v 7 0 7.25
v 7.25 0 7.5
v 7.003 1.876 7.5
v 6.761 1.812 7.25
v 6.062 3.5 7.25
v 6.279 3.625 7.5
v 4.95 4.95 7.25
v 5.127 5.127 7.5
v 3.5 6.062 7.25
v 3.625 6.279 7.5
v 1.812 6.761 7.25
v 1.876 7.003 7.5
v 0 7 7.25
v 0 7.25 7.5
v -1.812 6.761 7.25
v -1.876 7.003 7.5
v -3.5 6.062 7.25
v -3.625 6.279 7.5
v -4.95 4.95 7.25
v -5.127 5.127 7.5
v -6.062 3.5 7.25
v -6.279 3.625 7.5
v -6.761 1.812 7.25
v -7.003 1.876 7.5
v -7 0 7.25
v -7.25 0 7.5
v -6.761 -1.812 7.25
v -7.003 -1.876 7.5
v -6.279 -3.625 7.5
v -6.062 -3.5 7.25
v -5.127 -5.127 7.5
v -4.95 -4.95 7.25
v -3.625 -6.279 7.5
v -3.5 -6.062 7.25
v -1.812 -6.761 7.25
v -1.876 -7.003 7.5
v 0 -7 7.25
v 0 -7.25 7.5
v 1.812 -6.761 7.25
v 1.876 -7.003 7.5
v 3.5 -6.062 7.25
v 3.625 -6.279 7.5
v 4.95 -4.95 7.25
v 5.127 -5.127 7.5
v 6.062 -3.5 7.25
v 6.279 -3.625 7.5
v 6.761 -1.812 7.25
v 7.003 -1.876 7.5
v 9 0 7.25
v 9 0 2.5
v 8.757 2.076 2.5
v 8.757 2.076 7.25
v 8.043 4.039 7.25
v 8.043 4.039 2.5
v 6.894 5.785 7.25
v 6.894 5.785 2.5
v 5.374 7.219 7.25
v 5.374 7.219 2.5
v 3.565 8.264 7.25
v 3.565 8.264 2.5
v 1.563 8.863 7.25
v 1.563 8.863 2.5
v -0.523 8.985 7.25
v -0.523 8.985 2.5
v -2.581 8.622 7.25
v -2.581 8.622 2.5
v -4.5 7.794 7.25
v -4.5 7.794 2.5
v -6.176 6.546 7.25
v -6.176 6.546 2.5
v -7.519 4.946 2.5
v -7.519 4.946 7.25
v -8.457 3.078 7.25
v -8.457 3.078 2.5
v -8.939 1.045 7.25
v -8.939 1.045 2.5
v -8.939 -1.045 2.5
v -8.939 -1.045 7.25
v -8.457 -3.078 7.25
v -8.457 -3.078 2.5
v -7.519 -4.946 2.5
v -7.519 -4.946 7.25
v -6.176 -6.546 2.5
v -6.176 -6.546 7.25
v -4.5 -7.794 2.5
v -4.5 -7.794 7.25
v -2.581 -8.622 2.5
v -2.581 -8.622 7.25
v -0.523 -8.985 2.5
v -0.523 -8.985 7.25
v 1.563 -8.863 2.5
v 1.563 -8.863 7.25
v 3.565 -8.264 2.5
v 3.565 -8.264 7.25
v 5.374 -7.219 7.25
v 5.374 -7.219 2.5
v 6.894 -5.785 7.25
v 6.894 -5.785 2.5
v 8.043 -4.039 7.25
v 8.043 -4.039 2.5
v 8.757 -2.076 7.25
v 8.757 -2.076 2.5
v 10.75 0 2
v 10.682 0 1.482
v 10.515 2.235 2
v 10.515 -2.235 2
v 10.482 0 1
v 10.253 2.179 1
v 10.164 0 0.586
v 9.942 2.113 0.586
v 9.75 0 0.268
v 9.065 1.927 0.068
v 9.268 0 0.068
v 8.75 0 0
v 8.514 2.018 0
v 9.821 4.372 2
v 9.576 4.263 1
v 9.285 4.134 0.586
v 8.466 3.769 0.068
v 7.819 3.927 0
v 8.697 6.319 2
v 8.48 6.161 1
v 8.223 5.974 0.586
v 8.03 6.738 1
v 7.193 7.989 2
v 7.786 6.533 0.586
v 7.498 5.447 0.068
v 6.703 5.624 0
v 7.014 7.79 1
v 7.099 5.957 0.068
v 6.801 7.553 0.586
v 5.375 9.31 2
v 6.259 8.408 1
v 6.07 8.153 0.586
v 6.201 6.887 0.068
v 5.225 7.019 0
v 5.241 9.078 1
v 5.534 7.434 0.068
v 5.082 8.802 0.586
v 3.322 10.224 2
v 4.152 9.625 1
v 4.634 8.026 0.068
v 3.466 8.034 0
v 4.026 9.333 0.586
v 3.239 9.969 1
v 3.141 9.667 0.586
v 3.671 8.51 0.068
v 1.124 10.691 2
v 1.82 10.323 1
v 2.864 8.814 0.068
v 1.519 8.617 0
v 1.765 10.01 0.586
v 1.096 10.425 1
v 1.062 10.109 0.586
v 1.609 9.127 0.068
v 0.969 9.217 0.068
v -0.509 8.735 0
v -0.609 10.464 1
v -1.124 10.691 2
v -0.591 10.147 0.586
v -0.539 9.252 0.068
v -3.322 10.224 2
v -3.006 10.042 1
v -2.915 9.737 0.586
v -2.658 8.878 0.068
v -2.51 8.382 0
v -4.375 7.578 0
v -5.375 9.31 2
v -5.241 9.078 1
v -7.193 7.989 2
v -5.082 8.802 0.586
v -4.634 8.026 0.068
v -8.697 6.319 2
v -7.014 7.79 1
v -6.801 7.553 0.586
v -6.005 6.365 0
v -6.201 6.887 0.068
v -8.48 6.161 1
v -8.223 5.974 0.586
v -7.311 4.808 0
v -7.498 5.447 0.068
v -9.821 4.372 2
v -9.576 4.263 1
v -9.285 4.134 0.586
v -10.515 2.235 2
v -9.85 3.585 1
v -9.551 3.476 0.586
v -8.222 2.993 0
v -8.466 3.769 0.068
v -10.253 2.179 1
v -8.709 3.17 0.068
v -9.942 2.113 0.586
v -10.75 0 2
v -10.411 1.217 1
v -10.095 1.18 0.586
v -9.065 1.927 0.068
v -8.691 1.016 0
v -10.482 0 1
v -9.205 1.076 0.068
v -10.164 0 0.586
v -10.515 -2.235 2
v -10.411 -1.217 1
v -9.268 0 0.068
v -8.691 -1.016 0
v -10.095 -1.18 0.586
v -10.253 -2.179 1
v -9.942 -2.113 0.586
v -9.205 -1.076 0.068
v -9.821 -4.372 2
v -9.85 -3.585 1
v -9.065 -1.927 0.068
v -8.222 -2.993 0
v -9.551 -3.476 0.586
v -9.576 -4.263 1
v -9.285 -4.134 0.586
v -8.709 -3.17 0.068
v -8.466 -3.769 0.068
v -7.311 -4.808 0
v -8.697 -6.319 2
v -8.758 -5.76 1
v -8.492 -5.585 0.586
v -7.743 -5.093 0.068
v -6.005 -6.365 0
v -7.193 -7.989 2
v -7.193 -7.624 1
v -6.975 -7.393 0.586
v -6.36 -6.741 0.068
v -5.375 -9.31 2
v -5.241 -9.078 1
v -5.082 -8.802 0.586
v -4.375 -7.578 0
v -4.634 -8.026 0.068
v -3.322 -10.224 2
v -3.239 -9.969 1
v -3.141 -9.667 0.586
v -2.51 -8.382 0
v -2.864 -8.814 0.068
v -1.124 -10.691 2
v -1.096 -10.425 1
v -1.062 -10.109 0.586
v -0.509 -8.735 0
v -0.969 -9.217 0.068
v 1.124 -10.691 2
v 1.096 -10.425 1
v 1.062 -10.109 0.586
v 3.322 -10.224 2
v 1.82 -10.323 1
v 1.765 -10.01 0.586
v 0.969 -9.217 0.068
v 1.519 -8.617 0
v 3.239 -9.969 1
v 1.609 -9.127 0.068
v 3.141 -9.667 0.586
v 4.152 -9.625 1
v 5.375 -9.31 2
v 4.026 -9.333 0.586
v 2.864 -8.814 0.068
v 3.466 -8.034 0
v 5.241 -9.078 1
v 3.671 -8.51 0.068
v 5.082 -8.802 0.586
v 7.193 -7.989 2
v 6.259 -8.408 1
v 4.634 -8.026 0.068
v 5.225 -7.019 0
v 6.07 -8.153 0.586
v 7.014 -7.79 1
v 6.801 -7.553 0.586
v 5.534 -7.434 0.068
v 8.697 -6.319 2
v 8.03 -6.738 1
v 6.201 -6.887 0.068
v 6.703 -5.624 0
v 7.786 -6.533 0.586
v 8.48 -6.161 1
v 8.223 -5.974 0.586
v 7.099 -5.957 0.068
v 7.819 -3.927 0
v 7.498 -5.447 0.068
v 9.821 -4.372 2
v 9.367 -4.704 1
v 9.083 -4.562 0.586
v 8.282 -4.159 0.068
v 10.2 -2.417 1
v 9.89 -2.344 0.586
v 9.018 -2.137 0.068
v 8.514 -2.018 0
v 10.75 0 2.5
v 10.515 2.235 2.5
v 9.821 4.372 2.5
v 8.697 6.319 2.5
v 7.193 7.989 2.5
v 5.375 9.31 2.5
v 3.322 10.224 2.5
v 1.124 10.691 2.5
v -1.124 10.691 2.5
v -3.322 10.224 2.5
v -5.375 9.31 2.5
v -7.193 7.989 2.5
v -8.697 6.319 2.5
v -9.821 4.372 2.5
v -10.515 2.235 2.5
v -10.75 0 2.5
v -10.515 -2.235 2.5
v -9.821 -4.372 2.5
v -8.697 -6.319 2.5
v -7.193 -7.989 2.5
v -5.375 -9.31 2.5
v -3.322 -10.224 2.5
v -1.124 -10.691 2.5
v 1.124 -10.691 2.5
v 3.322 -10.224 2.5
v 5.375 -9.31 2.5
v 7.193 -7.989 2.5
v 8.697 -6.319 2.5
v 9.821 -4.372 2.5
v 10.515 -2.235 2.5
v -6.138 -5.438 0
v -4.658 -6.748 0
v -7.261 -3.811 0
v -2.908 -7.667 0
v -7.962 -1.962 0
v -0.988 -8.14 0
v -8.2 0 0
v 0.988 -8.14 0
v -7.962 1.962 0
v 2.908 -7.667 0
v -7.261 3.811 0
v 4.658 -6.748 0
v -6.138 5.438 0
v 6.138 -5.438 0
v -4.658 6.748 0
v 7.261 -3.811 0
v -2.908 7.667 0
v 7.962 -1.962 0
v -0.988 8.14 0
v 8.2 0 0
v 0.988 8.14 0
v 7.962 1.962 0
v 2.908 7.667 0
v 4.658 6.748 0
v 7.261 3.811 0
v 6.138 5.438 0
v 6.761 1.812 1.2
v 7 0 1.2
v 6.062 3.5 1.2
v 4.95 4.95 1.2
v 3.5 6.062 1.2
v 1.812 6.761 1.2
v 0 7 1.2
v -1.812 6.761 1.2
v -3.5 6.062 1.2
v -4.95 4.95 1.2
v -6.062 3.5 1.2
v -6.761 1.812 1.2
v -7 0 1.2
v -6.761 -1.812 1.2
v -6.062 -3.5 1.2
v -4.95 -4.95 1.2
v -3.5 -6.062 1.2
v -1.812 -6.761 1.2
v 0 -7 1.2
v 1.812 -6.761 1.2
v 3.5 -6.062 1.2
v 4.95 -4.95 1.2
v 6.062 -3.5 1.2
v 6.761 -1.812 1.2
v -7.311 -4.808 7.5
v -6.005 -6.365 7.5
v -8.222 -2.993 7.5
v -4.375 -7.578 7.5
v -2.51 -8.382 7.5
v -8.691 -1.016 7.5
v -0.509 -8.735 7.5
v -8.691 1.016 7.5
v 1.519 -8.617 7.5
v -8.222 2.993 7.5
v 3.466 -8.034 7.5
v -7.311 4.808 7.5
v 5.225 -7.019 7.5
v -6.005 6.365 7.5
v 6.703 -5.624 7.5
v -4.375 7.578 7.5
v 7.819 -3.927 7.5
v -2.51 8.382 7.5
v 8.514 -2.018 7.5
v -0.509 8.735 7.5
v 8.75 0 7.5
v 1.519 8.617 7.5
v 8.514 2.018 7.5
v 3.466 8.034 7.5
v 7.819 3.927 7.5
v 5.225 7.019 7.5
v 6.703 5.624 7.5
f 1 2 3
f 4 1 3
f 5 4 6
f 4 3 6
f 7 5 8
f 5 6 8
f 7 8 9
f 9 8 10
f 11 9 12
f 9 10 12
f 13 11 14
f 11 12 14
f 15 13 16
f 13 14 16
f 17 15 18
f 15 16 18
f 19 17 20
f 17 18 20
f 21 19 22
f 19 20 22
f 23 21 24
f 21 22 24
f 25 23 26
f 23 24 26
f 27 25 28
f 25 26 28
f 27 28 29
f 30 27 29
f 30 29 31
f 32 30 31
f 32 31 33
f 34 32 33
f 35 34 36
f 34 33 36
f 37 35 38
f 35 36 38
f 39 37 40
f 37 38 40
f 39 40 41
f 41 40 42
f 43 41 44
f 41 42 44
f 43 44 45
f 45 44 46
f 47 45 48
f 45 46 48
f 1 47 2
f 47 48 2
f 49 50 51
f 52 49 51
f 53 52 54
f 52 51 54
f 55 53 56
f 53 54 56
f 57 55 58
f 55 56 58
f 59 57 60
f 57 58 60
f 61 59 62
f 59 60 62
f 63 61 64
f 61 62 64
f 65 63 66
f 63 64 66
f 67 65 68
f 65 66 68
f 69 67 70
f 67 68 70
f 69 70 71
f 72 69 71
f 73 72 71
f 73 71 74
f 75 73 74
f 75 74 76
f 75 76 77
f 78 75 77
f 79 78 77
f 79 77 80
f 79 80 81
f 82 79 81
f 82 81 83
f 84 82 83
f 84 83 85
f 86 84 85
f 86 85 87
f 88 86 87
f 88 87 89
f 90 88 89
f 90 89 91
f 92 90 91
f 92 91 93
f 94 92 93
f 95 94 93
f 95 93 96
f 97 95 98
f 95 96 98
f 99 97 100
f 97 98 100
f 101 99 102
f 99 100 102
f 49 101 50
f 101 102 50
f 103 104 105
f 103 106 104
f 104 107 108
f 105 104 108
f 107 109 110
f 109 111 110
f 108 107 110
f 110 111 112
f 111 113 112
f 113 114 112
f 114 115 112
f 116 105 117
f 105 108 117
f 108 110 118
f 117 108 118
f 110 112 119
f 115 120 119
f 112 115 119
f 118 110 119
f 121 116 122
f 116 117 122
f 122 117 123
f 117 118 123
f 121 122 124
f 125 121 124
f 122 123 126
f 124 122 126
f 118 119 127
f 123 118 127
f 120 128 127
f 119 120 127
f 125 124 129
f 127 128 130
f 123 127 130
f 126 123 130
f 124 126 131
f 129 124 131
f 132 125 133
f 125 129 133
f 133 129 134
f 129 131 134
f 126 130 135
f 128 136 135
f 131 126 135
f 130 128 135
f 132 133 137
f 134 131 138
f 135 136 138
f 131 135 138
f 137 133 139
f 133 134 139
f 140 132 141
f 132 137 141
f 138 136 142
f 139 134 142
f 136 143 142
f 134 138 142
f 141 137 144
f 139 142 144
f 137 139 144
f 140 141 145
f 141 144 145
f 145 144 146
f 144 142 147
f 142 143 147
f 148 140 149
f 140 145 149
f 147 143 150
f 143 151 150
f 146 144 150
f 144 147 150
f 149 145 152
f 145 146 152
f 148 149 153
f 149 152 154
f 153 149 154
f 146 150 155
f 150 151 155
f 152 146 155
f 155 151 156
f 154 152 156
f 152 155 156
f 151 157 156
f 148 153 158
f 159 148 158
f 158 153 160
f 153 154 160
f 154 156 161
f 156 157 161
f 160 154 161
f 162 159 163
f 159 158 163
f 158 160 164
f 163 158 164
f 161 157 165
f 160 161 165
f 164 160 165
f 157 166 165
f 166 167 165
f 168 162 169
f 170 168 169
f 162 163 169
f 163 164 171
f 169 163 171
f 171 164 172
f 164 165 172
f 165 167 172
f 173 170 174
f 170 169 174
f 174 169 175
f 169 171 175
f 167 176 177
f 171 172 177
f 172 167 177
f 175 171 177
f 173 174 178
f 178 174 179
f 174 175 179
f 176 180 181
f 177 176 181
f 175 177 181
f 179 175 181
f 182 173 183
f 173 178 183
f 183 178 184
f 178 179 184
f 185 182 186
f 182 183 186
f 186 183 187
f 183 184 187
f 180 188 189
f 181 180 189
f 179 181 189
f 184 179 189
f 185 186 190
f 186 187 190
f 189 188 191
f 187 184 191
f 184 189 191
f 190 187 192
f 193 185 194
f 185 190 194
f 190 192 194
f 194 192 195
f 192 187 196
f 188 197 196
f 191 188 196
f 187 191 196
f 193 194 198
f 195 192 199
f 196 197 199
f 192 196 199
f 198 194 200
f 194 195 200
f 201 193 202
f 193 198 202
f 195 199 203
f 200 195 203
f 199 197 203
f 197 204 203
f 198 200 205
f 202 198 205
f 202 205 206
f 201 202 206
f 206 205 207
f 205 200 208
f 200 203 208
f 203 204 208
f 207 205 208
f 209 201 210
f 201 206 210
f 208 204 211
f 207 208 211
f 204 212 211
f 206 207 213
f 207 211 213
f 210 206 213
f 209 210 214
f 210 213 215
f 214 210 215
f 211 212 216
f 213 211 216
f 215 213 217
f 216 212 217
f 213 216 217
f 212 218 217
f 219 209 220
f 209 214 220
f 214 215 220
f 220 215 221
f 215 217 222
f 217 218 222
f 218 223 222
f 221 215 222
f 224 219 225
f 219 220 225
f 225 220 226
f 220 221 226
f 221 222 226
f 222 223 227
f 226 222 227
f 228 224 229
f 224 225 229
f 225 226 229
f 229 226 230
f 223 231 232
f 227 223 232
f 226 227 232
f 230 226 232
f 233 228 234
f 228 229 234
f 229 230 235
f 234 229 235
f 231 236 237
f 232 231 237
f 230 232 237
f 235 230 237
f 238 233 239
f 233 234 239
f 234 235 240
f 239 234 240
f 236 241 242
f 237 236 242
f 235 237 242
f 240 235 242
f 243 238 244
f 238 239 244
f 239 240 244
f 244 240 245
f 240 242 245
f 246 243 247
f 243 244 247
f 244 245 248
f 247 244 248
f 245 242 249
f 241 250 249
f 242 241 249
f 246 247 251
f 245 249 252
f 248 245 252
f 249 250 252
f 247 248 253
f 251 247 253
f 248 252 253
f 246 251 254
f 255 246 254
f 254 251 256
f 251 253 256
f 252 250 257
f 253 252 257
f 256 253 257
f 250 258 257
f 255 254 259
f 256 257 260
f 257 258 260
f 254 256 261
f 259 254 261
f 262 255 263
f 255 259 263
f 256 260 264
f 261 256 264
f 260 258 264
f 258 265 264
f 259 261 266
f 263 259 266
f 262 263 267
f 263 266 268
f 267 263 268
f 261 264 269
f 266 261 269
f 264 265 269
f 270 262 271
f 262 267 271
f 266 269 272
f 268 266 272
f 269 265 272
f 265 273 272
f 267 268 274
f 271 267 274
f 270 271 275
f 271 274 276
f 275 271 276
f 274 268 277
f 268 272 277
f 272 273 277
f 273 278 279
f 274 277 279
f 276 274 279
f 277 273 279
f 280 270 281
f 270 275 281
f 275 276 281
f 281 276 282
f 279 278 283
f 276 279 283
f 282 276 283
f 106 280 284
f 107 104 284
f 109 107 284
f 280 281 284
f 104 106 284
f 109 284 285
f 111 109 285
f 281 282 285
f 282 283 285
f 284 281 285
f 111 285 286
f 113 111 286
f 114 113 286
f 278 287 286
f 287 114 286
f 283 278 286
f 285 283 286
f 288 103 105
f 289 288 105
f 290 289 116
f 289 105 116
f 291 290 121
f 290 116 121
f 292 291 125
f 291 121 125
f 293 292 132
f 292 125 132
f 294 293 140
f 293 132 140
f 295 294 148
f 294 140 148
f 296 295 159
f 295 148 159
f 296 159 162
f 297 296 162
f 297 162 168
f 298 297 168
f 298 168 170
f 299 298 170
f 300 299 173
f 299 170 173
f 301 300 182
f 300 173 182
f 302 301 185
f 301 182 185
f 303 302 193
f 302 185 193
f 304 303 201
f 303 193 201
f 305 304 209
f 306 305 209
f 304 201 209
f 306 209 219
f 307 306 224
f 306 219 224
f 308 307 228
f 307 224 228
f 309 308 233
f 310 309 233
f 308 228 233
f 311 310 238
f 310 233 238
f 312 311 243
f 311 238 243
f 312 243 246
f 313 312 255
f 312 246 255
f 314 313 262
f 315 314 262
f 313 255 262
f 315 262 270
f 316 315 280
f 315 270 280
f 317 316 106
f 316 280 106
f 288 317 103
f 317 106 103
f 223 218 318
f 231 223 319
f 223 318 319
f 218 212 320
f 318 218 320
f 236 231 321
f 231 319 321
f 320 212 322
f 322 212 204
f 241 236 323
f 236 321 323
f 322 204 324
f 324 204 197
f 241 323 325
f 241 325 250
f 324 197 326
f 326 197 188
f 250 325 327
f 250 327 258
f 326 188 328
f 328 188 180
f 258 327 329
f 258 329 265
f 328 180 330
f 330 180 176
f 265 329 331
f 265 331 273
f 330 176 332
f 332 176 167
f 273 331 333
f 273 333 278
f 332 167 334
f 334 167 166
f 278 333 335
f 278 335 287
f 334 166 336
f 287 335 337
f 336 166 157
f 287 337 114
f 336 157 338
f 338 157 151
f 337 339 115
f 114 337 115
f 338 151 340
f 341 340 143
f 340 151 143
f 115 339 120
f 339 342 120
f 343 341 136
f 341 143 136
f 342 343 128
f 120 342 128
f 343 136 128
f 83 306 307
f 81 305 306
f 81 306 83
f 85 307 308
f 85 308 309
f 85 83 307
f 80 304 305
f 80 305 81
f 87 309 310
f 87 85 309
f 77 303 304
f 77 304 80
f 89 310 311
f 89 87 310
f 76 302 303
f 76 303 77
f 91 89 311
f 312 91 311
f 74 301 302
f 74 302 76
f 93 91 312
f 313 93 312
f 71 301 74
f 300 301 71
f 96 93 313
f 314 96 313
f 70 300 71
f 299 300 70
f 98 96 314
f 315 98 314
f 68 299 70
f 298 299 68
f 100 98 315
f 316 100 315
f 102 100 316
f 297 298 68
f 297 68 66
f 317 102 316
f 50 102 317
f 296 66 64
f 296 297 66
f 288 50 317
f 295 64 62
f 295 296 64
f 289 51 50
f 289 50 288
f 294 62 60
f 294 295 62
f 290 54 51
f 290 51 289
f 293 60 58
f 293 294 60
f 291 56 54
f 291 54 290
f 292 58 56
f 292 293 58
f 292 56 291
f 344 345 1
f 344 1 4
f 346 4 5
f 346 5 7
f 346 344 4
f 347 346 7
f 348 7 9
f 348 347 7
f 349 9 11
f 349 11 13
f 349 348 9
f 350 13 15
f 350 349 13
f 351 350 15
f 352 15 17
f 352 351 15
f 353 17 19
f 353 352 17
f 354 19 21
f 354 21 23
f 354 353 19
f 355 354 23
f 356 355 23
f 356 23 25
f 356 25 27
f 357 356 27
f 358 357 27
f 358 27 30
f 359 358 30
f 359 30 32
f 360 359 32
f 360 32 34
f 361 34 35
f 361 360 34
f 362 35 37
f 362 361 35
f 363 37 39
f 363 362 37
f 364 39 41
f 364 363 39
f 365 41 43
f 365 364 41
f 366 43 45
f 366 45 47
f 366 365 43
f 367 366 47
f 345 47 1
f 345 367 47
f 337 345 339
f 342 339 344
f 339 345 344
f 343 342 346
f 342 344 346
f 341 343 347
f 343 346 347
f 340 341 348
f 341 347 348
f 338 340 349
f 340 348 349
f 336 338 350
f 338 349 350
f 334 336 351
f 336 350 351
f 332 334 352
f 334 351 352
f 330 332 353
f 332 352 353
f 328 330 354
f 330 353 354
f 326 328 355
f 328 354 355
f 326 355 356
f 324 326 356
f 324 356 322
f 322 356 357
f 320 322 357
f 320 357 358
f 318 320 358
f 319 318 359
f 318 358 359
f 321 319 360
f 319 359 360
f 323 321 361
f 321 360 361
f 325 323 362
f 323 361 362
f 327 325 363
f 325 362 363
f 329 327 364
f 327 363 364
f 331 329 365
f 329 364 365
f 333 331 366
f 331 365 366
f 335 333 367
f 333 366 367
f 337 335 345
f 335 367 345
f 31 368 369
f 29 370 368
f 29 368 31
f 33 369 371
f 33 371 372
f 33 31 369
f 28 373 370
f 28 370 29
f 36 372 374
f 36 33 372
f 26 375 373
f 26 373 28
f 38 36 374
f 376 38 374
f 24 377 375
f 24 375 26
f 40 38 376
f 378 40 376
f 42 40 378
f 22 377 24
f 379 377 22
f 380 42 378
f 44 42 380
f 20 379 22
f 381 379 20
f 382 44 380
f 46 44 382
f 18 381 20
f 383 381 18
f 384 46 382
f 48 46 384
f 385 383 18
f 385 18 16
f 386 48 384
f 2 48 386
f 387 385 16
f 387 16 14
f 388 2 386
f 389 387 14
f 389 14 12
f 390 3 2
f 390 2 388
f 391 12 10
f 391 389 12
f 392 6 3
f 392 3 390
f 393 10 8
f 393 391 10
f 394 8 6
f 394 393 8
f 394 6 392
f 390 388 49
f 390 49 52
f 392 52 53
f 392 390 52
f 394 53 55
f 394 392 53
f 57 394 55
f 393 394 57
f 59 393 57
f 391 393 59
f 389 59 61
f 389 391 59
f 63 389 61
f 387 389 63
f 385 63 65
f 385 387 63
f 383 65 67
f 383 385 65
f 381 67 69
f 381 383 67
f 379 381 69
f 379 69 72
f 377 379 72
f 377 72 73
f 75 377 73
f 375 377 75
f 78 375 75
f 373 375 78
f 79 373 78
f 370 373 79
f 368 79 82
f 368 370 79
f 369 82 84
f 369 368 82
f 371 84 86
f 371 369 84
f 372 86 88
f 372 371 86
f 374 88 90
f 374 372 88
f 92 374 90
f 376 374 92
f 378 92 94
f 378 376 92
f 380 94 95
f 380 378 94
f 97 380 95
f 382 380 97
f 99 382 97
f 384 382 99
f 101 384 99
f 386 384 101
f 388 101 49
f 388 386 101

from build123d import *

# Parameters (mm, degrees)
F0_R     = 9
F0_R_2   = 7
F1_DEPTH = 7.5
F0_R_3   = 10.75
F2_DEPTH = 2.5
F3_SIZE  = 0.25
F4_R     = 2
F5_SIZE  = 1.2


with BuildPart() as f1:
    # F0 (on Top) → F1 (new body)
    with BuildSketch(Plane.XY):
        Circle(F0_R)
        Circle(F0_R_2, mode=Mode.SUBTRACT)
    extrude(amount=F1_DEPTH)

    # F0 (on Top) → F2 (join)
    with BuildSketch(Plane.XY):
        Circle(F0_R_3)
        Circle(F0_R, mode=Mode.SUBTRACT)
    extrude(amount=F2_DEPTH)

    # F3
    f3_edges = [f1.edges().sort_by_distance(p)[0] for p in [
        (-9, 0, 7.5),
        (-7, 0, 7.5),
    ]]
    chamfer(f3_edges, length=F3_SIZE)

    # F4
    f4_edges = [f1.edges().sort_by_distance(p)[0] for p in [
        (-10.75, 0, 0),
    ]]
    fillet(f4_edges, radius=F4_R)

    # F5
    f5_edges = [f1.edges().sort_by_distance(p)[0] for p in [
        (-7, 0, 0),
    ]]
    chamfer(f5_edges, length=F5_SIZE)


solid = f1.part
